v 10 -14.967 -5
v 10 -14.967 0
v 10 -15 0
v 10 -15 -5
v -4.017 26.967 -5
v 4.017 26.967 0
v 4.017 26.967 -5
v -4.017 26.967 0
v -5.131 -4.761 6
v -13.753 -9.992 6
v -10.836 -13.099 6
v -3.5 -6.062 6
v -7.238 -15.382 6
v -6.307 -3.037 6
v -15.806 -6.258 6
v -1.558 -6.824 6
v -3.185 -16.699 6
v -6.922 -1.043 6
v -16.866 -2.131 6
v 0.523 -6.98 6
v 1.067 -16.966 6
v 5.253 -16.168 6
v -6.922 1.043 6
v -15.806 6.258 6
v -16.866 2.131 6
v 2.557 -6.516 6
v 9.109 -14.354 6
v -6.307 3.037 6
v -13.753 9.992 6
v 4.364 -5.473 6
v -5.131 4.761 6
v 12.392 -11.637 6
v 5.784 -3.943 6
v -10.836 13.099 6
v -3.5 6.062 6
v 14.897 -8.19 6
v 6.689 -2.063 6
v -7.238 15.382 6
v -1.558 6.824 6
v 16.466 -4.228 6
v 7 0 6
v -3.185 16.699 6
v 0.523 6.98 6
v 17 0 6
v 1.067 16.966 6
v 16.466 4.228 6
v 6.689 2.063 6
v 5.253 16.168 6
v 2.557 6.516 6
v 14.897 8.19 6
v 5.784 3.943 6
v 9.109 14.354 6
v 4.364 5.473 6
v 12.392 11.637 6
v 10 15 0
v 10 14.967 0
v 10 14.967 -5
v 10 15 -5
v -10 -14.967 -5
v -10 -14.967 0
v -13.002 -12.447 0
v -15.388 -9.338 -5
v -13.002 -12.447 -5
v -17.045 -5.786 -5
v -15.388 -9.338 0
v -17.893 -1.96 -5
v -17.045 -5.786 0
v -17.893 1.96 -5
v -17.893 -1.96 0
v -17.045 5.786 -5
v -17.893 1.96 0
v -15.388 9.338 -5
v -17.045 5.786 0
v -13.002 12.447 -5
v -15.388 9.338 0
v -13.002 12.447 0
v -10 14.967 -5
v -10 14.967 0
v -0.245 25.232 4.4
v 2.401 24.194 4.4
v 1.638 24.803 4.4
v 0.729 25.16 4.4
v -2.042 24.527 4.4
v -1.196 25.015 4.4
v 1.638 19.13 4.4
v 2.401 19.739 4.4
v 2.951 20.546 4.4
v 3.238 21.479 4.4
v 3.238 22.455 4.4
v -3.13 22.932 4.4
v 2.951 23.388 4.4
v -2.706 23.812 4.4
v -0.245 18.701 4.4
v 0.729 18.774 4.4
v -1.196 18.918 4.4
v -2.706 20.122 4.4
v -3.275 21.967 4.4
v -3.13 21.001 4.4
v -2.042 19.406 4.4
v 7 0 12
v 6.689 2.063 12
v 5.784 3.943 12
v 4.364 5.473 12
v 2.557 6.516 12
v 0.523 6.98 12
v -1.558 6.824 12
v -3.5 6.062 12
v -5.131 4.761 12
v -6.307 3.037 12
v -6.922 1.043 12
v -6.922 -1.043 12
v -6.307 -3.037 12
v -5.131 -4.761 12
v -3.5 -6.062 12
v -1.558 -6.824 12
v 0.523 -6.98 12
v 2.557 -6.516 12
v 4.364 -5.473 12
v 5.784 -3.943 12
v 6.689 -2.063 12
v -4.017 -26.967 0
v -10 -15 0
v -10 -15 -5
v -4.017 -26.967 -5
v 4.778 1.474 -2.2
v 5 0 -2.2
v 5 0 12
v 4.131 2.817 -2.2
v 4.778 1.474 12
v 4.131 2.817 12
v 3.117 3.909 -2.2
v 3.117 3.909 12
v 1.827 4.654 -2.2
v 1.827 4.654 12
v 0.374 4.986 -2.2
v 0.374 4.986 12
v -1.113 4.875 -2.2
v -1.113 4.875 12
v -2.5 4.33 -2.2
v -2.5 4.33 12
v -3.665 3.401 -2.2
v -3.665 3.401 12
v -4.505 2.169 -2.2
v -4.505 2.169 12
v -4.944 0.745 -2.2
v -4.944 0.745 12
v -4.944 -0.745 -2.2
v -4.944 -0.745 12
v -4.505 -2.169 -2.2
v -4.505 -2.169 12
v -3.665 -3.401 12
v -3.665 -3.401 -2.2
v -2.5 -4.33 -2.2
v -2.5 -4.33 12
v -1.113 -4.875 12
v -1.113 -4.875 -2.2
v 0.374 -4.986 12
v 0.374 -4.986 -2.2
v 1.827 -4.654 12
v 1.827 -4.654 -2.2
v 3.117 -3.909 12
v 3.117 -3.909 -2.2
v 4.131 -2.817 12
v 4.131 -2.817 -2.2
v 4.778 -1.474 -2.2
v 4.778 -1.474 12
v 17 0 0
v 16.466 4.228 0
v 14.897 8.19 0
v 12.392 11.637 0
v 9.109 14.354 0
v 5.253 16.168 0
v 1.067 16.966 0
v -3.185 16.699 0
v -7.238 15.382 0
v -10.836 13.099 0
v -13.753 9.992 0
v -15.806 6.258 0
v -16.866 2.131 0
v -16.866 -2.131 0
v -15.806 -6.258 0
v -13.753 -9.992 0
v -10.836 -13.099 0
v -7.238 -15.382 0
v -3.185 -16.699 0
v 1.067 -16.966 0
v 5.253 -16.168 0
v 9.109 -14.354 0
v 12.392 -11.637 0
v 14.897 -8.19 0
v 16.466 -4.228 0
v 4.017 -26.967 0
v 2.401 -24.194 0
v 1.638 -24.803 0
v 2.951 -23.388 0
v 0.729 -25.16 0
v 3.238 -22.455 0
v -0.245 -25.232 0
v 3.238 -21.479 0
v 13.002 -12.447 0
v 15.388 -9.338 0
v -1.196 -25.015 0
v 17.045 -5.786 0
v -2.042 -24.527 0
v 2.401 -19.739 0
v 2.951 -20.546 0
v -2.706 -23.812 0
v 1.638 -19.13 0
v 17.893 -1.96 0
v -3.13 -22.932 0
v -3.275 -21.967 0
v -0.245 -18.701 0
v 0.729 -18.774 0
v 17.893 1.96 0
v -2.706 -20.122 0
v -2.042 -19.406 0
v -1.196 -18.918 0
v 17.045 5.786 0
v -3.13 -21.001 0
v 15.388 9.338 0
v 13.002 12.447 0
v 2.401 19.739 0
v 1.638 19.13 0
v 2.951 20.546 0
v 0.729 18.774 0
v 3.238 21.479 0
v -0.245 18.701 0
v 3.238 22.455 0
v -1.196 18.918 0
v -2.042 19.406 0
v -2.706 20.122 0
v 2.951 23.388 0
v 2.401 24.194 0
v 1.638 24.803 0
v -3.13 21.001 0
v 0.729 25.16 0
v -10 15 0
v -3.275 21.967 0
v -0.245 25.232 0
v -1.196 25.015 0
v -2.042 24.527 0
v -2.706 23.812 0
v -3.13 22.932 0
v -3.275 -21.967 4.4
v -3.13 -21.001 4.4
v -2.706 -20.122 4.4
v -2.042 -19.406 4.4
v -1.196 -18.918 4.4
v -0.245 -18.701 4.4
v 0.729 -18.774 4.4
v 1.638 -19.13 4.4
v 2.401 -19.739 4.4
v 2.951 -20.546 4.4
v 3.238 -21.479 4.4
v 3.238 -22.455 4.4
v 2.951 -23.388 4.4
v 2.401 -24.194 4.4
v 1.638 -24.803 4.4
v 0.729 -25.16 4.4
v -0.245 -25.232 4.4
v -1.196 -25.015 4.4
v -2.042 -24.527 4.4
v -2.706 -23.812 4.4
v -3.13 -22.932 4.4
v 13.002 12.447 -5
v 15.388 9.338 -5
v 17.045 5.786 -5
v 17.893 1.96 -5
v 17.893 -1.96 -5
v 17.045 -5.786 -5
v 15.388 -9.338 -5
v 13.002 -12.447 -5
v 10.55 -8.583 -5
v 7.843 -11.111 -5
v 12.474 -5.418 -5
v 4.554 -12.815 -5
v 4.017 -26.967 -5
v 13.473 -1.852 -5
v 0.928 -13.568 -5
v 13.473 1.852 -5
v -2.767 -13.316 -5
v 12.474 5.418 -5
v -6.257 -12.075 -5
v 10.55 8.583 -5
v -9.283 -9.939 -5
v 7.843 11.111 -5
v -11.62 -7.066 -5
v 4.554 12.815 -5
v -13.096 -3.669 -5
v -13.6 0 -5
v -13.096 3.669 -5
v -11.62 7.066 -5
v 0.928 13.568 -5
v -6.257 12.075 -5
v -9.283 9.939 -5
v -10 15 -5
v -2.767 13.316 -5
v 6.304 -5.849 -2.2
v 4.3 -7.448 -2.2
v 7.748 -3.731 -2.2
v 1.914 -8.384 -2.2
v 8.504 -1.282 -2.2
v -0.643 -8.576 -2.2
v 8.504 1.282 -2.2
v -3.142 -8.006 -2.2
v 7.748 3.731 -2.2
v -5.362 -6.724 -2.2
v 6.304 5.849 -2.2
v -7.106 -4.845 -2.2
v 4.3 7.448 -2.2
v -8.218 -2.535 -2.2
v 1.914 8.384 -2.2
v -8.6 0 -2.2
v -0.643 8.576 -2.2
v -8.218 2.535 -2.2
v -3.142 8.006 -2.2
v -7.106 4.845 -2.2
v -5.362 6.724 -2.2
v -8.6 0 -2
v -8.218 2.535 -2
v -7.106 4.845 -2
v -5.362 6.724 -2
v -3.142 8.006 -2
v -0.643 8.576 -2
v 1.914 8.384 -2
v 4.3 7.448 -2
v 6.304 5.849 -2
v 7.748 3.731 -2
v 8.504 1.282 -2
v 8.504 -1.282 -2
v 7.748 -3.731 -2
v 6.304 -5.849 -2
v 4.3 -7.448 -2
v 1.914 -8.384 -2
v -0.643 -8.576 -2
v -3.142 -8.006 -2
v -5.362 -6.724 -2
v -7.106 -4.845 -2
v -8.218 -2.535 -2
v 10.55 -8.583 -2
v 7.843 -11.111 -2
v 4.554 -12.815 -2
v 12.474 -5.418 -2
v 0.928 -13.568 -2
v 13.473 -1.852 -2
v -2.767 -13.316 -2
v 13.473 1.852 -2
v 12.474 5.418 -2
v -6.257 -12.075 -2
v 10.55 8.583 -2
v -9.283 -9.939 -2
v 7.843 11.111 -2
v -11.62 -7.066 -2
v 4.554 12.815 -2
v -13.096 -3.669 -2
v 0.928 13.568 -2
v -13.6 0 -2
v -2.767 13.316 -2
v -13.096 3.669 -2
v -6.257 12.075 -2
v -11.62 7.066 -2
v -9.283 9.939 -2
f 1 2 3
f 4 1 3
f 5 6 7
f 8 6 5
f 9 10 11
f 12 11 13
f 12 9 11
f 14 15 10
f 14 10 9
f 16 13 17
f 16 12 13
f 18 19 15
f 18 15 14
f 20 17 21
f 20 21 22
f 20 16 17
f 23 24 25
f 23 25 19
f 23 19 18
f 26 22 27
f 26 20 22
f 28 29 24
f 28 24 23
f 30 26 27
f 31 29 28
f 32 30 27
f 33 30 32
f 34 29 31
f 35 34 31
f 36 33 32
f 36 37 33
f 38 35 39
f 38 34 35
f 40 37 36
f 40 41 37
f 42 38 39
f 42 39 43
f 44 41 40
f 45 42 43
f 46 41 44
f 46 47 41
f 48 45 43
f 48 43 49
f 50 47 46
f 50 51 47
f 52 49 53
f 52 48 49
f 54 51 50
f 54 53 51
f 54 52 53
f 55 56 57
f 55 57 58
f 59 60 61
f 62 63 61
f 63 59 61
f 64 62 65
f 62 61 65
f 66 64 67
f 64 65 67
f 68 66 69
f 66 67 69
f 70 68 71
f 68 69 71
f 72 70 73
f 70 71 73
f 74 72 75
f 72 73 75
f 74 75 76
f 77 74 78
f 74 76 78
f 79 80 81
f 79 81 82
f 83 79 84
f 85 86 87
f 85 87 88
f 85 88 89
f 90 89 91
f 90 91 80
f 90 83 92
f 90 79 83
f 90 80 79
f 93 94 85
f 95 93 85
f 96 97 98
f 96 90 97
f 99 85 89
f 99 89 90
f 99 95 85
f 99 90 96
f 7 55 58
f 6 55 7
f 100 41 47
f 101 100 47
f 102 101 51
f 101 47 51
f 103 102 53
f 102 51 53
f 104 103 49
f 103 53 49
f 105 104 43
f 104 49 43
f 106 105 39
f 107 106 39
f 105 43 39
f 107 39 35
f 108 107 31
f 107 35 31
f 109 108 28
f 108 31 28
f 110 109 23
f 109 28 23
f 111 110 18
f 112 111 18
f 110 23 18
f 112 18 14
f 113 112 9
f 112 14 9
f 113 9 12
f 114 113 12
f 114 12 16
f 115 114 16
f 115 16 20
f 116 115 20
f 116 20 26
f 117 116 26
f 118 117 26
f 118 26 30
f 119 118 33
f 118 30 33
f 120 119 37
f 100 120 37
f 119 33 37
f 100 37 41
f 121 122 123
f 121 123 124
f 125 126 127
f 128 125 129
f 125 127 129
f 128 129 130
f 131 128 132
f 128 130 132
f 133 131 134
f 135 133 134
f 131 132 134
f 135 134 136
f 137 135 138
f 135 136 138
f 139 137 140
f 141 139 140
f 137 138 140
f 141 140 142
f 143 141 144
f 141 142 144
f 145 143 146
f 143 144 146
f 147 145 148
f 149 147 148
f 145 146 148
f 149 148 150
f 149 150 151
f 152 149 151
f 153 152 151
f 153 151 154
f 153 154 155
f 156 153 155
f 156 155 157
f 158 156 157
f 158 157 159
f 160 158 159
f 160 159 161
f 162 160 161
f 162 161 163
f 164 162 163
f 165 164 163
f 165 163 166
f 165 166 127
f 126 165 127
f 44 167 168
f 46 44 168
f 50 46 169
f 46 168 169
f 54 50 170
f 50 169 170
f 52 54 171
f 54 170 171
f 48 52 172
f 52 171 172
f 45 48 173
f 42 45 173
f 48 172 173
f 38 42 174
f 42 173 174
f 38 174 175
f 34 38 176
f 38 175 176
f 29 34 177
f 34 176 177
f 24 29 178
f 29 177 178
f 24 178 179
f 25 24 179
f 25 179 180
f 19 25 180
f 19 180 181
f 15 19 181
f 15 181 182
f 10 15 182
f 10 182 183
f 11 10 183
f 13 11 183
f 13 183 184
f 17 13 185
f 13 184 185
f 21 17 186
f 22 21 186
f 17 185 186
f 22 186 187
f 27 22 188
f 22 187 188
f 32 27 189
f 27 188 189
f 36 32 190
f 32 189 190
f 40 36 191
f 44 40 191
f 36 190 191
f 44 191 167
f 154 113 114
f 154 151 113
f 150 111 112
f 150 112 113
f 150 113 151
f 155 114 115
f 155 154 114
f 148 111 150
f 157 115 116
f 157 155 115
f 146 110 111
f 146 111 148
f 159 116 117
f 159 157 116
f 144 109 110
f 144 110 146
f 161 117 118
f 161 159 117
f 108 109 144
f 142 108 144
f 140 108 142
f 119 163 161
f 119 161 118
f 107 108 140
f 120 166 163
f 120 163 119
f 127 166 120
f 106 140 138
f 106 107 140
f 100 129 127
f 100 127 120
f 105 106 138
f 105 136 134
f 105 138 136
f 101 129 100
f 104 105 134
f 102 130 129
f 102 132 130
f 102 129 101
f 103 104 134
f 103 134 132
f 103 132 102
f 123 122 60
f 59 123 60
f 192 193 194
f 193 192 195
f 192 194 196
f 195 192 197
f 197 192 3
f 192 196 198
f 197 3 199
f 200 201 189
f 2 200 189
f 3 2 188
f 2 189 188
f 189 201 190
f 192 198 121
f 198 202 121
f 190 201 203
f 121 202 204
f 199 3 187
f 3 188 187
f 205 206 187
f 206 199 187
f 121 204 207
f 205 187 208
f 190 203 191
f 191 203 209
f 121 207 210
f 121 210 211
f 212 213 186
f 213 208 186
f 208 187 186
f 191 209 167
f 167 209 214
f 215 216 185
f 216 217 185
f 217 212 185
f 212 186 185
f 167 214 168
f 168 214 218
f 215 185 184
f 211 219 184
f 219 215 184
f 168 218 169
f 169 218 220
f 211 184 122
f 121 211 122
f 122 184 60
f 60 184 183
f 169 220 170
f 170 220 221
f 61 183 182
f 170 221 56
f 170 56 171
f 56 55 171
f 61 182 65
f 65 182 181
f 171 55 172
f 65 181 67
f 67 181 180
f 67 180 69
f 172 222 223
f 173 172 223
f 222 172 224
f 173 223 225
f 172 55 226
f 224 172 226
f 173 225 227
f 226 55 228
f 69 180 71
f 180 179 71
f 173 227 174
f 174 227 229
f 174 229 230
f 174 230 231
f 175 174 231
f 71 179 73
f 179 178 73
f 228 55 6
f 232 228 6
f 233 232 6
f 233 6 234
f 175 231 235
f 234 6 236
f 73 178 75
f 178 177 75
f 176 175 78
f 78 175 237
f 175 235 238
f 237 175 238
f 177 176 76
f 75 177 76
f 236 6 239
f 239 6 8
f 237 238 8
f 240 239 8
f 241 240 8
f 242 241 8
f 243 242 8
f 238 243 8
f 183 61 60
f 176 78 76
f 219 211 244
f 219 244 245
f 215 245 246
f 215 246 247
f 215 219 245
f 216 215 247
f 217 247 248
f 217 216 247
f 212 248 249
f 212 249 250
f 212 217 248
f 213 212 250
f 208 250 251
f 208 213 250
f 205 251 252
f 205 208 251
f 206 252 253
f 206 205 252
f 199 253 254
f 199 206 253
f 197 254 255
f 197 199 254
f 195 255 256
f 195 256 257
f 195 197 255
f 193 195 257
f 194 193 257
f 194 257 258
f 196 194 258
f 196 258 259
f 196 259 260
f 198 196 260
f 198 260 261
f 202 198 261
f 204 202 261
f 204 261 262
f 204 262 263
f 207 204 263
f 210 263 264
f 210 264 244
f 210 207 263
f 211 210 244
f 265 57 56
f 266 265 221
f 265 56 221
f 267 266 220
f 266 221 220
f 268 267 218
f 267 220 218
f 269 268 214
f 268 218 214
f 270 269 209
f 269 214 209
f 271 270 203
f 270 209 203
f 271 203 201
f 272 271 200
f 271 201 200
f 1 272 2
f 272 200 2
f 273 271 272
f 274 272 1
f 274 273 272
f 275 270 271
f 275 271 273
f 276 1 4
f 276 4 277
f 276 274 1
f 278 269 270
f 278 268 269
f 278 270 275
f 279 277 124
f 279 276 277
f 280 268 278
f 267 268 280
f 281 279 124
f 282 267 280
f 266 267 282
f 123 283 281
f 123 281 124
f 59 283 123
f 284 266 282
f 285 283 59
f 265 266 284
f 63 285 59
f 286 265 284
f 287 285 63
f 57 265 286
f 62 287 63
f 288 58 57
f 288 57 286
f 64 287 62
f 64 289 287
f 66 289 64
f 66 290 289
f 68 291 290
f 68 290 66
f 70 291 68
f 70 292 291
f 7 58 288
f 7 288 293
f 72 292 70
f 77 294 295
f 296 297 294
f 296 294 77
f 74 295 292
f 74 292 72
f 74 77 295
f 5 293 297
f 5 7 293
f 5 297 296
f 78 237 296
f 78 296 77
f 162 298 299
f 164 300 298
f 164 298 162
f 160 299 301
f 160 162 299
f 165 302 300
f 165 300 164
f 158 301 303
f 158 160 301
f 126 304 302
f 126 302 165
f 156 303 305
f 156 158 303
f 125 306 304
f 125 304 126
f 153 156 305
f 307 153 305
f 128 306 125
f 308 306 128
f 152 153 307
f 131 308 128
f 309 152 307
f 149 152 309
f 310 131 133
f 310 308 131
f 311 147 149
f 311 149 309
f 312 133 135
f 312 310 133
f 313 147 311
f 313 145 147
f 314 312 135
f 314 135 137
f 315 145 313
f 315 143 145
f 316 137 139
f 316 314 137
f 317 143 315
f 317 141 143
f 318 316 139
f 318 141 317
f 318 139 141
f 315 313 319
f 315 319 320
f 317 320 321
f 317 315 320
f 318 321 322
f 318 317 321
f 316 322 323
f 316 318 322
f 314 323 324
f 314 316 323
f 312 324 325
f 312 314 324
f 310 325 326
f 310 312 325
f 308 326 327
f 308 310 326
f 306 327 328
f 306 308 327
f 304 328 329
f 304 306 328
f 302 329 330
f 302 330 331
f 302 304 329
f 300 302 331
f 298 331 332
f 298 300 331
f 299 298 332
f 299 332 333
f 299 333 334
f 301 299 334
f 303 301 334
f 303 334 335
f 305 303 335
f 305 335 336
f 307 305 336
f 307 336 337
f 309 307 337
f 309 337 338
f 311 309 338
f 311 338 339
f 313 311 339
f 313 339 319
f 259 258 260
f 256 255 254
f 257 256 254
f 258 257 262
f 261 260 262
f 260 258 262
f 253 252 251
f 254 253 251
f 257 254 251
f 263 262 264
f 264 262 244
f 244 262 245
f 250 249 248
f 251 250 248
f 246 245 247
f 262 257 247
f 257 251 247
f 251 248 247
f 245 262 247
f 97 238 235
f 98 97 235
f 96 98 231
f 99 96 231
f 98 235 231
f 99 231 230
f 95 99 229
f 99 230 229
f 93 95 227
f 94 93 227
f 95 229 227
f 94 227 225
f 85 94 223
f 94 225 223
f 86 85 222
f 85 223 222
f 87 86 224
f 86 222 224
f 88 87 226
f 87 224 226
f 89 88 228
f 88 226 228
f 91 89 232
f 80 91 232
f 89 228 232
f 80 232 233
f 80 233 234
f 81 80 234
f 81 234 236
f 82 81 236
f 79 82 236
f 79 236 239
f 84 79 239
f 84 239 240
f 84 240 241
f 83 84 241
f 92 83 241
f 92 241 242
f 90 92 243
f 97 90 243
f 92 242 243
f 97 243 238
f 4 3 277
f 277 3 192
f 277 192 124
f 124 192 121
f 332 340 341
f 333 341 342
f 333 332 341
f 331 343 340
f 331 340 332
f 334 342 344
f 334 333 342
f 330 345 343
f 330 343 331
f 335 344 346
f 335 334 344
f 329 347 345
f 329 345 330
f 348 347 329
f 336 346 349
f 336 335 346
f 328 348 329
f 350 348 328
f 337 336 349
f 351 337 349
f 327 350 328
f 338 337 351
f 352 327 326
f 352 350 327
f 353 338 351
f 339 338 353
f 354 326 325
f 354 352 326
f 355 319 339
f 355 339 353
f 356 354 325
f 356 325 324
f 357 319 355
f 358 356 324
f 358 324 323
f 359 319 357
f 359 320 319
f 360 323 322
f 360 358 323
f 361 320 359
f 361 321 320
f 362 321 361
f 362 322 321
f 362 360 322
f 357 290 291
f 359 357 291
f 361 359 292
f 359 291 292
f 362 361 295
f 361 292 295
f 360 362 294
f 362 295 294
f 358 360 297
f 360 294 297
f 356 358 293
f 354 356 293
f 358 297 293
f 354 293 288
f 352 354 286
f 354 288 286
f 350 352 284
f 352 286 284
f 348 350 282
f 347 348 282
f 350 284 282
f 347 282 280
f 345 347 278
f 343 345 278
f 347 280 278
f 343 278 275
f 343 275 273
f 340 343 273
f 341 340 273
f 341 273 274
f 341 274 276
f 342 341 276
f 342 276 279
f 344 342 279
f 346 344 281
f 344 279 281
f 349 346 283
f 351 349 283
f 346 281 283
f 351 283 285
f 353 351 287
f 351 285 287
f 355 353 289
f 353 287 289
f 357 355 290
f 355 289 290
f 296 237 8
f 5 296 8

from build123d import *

# Parameters (mm, degrees)
SKETCH_1_R          = 17
EXTRUDE_1_DEPTH     = 6
SKETCH_2_R          = 7
EXTRUDE_2_DEPTH     = 6
SKETCH_3_R          = 18
EXTRUDE_3_DEPTH     = 5
EXTRUDE_START       = -5
EXTRUDE_6_DEPTH     = 5
CUT_EXTRUDE_1_DEPTH = 8
SKETCH_6_R          = 3.275
EXTRUDE_5_DEPTH     = 4.4
SKETCH_9_R          = 5
CUT_EXTRUDE_3_DEPTH = 37.608729958
SKETCH_10_R         = 13.6
SKETCH_10_R_2       = 8.6
CUT_EXTRUDE_4_DEPTH = 3
SKETCH_11_R         = 8.6
CUT_EXTRUDE_5_DEPTH = 2.8


with BuildPart() as part:
    # 스케치1 → 보스-돌출1 (new body)
    with BuildSketch(Plane.XY):
        Circle(SKETCH_1_R)
    extrude(amount=EXTRUDE_1_DEPTH)

    # 스케치2 → 보스-돌출2 (add)
    with BuildSketch(Plane.XY.offset(6)):
        Circle(SKETCH_2_R)
    extrude(amount=EXTRUDE_2_DEPTH)

    # 스케치3 → 보스-돌출3 (add)
    with BuildSketch(Plane(origin=(0, 0, 0), x_dir=(-1, 0, 0), z_dir=(0, 0, -1))):
        Circle(SKETCH_3_R)
    extrude(amount=EXTRUDE_3_DEPTH)

    # 스케치8 → 보스-돌출6 (add)
    with BuildSketch(Plane(origin=(0, 0, -5), x_dir=(-1, 0, 0), z_dir=(0, 0, -1)).offset(EXTRUDE_START)):
        with BuildLine():
            Line((-10, 14.966629547), (-10, 26.966629547))
            Line((-10, 26.966629547), (10, 26.966629547))
            Line((10, 26.966629547), (10, 14.966629547))
            ThreePointArc((10, 14.966629547), (0, 18), (-10, 14.966629547))
        make_face()
    extrude_6 = extrude(amount=EXTRUDE_6_DEPTH)

    # 스케치5 → 컷-돌출1 (cut)
    with BuildSketch(Plane.XY):
        Polygon((-10, 27), (-10, 15), (-4, 27), align=None)
        Polygon((4, 27), (10, 27), (10, 15), align=None)
    cut_extrude_1 = extrude(amount=-CUT_EXTRUDE_1_DEPTH, mode=Mode.SUBTRACT)

    # 스케치6 → 보스-돌출5 (add)
    with BuildSketch(Plane.XY):
        with Locations(Location((0, 21.966629547, 0), (0, 0, 180))):
            Circle(SKETCH_6_R)
    extrude_5 = extrude(amount=EXTRUDE_5_DEPTH)

    # 대칭 복사6: 보스-돌출6, 컷-돌출1, 보스-돌출5 across plane
    add(extrude_6.mirror(Plane.ZX))
    add(cut_extrude_1.mirror(Plane.ZX), mode=Mode.SUBTRACT)
    add(extrude_5.mirror(Plane.ZX))

    # 스케치9 → 컷-돌출3 (cut, through all)
    with BuildSketch(Plane.XY.offset(12)):
        Circle(SKETCH_9_R)
    extrude(amount=-CUT_EXTRUDE_3_DEPTH, mode=Mode.SUBTRACT)

    # 스케치10 → 컷-돌출4 (cut)
    with BuildSketch(Plane(origin=(0, 0, -5), x_dir=(-1, 0, 0), z_dir=(0, 0, -1))):
        Circle(SKETCH_10_R)
        Circle(SKETCH_10_R_2, mode=Mode.SUBTRACT)
    extrude(amount=-CUT_EXTRUDE_4_DEPTH, mode=Mode.SUBTRACT)

    # 스케치11 → 컷-돌출5 (cut)
    with BuildSketch(Plane(origin=(0, 0, -5), x_dir=(-1, 0, 0), z_dir=(0, 0, -1))):
        Circle(SKETCH_11_R)
    extrude(amount=-CUT_EXTRUDE_5_DEPTH, mode=Mode.SUBTRACT)


solid = part.part
